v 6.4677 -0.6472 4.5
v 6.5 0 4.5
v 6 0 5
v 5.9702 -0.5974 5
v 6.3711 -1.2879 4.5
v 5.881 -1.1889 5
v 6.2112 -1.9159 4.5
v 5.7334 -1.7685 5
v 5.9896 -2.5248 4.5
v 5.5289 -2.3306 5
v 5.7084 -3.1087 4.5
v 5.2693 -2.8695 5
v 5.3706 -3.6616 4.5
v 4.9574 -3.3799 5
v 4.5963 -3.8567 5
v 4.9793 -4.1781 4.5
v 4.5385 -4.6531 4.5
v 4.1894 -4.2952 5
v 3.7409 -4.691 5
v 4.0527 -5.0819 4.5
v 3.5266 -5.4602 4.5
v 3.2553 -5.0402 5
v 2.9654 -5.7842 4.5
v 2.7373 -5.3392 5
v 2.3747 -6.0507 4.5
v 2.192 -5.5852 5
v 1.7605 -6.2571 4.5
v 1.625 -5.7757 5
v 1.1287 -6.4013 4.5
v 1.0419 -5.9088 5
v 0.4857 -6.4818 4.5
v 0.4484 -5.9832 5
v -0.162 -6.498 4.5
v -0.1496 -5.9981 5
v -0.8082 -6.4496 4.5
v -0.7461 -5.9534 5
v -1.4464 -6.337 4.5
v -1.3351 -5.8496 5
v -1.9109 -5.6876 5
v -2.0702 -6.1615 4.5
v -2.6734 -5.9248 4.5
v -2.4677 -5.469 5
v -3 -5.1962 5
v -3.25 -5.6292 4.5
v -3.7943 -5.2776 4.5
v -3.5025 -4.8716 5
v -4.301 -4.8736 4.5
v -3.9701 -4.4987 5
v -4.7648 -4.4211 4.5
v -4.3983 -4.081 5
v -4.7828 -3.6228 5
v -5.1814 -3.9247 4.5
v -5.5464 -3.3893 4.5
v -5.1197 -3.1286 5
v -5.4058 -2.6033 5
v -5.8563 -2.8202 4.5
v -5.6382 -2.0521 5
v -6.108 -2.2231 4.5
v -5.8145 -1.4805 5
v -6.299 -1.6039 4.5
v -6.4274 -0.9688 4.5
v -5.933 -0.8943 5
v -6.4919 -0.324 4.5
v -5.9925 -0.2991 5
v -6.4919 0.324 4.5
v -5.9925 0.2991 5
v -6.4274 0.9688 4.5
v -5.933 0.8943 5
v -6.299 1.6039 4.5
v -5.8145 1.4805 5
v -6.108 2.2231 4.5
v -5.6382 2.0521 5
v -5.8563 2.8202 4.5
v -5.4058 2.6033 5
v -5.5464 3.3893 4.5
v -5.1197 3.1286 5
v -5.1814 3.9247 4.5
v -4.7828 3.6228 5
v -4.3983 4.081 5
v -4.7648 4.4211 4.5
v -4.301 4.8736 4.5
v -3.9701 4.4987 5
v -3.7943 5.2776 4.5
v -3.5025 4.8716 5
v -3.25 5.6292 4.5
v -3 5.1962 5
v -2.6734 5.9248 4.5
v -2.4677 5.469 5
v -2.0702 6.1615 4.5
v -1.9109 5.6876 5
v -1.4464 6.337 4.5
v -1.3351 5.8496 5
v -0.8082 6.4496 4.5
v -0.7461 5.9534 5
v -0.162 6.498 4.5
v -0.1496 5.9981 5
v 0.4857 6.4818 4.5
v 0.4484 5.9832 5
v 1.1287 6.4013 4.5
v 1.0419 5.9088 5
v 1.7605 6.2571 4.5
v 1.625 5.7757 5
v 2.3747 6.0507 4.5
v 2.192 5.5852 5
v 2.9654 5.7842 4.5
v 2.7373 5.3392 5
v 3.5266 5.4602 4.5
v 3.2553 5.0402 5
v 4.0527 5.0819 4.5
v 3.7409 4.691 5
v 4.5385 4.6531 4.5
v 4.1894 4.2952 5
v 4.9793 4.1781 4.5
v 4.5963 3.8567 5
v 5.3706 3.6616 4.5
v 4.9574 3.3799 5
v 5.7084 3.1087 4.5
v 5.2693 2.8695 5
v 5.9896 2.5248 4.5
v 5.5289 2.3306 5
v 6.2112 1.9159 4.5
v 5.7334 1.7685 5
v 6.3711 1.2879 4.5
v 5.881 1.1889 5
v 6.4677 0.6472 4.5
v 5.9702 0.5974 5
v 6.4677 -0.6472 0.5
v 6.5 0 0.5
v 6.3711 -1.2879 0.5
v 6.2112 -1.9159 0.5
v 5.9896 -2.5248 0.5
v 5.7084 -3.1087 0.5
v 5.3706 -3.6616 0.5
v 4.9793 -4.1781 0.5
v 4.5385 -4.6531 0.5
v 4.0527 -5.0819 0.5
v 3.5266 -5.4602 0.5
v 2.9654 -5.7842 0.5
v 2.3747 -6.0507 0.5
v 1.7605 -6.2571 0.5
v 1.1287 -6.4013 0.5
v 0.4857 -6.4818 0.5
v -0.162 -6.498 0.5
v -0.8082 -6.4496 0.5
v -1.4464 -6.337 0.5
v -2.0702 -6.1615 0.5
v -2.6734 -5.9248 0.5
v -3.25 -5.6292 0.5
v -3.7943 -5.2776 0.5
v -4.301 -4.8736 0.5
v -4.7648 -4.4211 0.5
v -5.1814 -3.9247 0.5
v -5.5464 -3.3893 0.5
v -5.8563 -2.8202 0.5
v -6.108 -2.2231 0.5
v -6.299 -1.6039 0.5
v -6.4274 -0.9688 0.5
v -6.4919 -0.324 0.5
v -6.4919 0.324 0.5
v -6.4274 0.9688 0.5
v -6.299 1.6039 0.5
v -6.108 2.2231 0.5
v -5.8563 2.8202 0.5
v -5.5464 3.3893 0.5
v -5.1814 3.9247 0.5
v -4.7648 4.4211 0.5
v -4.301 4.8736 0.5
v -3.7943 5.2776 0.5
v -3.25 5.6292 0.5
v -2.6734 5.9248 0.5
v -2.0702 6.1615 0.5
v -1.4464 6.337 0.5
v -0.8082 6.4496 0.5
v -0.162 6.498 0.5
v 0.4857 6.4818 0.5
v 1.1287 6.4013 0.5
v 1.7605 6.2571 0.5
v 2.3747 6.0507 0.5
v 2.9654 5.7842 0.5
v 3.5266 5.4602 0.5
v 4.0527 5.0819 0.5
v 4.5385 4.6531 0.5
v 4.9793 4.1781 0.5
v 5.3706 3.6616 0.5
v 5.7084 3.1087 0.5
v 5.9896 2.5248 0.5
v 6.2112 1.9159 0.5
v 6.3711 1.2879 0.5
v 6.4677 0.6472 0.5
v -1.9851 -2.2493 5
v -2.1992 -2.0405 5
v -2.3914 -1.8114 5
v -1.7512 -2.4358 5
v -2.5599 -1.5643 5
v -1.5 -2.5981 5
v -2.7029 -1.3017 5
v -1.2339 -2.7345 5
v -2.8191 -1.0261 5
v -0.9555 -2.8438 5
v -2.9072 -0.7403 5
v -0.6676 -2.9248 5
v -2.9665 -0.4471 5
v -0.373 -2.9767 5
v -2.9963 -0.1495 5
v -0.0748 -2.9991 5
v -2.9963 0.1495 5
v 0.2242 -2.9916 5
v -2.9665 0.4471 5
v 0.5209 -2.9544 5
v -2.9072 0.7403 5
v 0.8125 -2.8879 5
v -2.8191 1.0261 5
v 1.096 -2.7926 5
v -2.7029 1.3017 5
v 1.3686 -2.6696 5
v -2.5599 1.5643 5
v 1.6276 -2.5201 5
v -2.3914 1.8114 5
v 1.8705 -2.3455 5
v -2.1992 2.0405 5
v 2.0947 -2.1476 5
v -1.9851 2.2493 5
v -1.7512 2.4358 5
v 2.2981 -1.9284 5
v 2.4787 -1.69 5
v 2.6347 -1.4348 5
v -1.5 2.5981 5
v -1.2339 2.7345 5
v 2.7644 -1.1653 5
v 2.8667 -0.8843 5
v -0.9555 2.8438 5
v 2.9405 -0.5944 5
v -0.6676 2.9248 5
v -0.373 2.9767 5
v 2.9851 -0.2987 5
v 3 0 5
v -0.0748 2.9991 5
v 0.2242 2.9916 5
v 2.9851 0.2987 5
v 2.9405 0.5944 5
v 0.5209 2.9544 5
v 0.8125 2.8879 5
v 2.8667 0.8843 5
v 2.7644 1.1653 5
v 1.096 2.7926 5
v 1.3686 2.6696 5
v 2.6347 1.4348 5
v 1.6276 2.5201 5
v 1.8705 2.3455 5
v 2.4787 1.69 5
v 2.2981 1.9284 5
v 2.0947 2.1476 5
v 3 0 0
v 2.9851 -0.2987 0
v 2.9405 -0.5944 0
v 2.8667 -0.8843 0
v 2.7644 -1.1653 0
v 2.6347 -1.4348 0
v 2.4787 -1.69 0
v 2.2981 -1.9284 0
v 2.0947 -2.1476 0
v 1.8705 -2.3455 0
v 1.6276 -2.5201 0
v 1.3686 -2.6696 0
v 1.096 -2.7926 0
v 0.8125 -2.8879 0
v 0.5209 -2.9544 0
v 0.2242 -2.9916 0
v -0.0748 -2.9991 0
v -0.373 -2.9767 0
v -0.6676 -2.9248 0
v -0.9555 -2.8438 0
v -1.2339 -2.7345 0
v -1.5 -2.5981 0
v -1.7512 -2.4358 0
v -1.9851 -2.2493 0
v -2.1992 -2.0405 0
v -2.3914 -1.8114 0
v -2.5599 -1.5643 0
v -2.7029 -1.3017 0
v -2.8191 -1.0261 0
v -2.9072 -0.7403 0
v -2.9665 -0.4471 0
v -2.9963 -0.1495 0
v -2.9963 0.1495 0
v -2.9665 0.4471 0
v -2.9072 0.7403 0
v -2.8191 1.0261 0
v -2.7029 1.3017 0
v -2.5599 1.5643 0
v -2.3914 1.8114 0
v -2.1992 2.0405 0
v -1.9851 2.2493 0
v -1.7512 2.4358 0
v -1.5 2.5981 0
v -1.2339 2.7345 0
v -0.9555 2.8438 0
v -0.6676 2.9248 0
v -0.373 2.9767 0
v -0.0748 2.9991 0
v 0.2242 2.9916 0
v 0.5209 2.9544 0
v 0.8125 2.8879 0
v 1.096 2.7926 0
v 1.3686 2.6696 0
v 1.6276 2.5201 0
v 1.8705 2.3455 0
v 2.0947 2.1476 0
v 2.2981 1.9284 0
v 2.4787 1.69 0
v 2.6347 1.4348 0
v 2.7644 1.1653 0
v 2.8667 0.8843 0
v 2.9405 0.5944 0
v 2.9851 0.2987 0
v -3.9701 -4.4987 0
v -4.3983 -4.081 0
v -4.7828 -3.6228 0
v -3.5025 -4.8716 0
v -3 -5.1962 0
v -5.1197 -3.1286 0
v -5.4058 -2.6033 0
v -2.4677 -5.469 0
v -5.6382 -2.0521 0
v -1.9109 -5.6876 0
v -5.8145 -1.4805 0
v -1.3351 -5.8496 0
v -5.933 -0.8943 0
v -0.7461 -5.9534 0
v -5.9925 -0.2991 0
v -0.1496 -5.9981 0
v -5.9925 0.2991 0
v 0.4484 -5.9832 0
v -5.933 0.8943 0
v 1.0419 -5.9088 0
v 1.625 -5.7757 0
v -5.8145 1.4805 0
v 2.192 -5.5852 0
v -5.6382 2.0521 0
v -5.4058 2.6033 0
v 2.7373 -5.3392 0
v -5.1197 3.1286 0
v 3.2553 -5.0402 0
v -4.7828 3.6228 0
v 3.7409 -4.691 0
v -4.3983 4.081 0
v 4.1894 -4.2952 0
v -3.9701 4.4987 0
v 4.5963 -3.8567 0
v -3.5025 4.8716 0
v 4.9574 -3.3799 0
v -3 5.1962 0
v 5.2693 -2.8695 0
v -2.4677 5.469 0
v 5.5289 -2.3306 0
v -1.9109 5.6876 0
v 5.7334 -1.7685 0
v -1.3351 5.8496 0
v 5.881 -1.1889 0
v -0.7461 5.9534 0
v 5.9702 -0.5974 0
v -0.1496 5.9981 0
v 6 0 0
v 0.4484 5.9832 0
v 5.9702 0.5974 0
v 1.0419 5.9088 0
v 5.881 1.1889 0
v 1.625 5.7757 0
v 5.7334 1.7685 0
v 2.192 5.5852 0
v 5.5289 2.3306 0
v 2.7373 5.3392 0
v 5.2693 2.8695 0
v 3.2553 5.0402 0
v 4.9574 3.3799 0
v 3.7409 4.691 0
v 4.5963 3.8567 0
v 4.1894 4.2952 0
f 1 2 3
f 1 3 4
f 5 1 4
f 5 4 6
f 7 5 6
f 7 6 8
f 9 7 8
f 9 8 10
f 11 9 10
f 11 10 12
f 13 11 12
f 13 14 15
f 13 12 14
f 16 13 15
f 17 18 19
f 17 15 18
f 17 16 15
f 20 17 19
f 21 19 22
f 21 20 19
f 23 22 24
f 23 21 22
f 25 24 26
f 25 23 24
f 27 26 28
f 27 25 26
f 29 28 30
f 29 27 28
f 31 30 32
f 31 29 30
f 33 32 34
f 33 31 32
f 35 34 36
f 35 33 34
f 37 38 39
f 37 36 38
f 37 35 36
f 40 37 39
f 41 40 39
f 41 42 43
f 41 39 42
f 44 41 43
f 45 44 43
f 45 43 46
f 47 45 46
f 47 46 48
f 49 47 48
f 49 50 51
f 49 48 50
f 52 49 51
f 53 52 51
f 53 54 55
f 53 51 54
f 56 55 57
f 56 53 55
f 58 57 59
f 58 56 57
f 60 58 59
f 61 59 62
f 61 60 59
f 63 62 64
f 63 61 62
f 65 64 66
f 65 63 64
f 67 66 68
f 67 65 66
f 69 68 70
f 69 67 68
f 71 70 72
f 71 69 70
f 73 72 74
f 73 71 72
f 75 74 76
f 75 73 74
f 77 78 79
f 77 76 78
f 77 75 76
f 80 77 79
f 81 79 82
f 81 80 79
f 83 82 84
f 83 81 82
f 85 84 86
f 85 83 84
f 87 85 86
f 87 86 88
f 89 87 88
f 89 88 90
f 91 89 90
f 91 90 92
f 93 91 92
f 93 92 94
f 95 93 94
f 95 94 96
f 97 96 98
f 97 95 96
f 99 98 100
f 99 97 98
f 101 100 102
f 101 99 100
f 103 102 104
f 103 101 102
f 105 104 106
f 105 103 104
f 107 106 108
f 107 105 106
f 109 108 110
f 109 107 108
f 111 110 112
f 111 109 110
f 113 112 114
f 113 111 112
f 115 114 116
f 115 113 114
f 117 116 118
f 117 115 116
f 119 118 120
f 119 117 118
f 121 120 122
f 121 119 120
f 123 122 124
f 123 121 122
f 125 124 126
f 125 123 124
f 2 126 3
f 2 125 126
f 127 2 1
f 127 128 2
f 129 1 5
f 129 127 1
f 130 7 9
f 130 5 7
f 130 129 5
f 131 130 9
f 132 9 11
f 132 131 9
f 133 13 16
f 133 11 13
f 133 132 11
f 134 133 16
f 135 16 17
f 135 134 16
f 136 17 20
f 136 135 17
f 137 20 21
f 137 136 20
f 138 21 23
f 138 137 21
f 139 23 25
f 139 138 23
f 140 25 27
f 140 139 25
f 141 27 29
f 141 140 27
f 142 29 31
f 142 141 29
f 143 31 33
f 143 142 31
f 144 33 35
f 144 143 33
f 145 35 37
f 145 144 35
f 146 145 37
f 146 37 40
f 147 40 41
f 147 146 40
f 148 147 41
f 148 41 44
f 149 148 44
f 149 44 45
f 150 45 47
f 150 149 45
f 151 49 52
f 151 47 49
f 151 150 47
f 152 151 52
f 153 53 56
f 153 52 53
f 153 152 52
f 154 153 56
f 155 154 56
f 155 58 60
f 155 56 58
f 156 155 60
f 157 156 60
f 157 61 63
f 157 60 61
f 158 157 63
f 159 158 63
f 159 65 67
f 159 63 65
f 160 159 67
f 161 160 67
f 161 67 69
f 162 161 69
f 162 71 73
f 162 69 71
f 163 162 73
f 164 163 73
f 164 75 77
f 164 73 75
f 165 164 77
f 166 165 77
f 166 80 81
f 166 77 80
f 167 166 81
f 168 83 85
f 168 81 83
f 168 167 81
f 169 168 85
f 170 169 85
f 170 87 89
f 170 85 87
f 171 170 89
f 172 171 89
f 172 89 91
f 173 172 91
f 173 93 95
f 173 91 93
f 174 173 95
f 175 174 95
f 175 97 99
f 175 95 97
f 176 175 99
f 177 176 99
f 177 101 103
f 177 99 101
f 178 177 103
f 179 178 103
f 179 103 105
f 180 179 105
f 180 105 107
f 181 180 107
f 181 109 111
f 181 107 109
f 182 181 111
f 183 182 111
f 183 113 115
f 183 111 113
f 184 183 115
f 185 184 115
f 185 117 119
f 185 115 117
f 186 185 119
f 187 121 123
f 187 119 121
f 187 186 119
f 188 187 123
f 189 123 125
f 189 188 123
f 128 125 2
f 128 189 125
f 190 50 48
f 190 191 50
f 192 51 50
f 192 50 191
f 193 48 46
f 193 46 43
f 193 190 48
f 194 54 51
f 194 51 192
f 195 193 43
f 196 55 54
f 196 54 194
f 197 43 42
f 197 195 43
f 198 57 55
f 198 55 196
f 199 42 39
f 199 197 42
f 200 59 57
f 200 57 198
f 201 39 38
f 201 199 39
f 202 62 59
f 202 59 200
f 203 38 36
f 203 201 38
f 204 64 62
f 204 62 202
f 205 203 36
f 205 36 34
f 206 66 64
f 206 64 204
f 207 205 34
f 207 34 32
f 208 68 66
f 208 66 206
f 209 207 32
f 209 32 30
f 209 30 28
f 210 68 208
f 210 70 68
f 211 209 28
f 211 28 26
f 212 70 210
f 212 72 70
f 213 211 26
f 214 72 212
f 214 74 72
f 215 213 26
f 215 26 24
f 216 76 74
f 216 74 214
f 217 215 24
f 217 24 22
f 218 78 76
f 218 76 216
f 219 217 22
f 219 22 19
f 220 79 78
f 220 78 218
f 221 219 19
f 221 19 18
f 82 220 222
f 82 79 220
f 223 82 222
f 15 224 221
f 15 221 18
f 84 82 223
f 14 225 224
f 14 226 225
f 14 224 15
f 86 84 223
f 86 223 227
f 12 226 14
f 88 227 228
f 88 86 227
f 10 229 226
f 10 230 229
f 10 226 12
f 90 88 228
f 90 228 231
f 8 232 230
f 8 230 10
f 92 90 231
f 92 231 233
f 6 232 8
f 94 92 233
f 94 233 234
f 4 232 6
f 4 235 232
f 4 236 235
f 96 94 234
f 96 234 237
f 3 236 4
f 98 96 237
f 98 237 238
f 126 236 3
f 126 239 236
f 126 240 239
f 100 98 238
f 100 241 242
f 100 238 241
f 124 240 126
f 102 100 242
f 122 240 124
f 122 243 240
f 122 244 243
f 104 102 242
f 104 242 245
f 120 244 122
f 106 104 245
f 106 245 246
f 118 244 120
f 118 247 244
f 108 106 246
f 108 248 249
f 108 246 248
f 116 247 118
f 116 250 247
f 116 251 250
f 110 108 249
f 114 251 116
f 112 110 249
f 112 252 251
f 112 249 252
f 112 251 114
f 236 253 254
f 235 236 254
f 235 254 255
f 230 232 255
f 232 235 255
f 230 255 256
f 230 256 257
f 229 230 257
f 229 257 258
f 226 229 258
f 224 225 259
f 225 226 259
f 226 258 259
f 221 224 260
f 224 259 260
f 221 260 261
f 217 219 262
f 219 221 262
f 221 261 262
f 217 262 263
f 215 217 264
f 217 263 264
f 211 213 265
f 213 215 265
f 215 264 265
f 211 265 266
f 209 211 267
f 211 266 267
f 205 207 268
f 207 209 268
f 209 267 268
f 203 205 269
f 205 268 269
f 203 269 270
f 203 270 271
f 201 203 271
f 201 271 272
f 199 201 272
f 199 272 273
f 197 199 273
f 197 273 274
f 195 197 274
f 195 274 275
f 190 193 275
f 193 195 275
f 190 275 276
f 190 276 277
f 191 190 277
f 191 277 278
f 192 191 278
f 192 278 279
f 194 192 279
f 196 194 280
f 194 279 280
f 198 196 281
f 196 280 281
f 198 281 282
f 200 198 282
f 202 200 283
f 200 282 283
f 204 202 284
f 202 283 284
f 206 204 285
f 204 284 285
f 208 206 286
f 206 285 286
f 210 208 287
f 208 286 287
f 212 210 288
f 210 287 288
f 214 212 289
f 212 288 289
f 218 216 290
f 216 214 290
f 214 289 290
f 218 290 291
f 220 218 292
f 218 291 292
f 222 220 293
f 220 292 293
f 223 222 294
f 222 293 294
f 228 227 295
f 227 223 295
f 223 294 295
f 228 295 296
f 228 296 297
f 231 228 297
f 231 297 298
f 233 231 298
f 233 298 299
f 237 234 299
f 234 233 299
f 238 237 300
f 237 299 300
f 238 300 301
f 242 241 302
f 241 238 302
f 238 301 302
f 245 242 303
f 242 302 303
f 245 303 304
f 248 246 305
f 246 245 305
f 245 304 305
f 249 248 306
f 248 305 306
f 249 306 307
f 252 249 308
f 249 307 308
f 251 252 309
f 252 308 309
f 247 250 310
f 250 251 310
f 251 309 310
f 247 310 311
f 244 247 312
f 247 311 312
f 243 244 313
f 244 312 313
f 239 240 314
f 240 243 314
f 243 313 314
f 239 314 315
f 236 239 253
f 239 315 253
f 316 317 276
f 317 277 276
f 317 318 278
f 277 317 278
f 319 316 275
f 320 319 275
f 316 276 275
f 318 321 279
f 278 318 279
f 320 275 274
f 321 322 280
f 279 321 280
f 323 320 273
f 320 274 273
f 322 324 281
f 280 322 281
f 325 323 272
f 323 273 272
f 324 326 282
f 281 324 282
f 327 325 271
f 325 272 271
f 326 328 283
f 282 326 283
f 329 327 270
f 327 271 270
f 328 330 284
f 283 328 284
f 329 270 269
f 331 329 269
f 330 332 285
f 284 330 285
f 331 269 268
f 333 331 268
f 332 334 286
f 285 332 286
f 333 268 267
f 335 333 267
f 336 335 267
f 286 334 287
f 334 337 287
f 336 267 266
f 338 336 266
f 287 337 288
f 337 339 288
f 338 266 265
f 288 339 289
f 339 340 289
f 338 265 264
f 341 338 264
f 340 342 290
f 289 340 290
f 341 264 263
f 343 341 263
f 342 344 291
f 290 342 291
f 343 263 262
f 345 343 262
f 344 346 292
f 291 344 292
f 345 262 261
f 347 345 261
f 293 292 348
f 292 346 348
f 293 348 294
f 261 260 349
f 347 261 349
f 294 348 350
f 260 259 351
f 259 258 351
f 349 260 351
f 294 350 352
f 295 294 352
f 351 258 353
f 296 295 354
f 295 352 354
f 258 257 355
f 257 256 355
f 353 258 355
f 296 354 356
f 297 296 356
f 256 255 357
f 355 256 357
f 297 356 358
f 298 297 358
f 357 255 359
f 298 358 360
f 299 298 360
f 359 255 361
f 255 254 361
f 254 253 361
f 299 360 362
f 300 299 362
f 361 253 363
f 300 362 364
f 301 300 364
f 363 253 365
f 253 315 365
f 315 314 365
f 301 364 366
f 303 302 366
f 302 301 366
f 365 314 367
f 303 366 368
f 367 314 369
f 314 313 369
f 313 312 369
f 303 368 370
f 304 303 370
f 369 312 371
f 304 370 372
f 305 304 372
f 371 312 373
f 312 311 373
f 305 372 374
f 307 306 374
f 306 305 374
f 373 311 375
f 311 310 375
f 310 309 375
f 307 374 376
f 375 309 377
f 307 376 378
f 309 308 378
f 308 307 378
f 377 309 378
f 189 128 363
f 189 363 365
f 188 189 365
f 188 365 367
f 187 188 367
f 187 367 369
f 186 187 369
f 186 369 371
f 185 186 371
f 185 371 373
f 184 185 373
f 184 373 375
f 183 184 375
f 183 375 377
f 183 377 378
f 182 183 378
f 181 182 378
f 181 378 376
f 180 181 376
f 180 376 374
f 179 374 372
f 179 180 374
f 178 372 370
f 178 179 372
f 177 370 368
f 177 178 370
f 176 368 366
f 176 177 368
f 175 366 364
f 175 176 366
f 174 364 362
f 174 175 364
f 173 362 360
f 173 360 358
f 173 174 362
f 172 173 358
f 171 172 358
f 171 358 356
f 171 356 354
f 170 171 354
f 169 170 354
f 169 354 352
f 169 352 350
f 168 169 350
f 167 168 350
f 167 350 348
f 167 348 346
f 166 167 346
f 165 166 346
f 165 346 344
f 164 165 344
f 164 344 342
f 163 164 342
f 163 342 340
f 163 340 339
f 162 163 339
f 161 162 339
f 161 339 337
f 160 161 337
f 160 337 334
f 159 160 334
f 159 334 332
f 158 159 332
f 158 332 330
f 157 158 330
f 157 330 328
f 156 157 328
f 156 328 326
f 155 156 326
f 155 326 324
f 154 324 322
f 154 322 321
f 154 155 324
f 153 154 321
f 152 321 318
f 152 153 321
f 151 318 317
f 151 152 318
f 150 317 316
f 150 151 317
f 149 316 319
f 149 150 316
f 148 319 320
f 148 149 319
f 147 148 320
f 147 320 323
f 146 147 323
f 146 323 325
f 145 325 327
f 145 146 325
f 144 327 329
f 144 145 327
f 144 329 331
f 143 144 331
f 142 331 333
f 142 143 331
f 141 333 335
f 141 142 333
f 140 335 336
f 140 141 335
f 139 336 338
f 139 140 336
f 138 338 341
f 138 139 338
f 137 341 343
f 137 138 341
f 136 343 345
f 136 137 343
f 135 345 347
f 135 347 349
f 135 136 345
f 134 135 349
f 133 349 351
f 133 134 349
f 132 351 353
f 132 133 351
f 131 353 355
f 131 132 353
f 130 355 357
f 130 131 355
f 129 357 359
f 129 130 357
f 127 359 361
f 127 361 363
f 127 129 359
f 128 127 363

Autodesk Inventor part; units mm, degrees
ref_plane "YZ Plane" through (0, 0, 0) normal (1, 0, 0) x (0, 1, 0)
ref_plane "XZ Plane" through (0, 0, 0) normal (0, 1, 0) x (-1, 0, 0)
ref_plane "XY Plane" through (0, 0, 0) normal (0, 0, 1) x (1, 0, 0)
sketch "Szkic1" plane through (0, 0, 0) normal (0, 0, 1) x (1, 0, 0)
  circle A0 centre (0, 0) radius 3
  circle A1 centre (0, 0) radius 6.5
  dimension "d0" = 6
  dimension "d1" = 13
extrude "Wyciągnięcie proste1" add sketch "Szkic1" along normal blind 5
chamfer "Faza1" distance 0.5 angle 45 1 edges at (-6.5, 0, 5)
chamfer "Faza2" distance 0.5 angle 45 1 edges at (-6.5, 0, 0)
properties part number "686_bearing" material "Aluminum 6061"
